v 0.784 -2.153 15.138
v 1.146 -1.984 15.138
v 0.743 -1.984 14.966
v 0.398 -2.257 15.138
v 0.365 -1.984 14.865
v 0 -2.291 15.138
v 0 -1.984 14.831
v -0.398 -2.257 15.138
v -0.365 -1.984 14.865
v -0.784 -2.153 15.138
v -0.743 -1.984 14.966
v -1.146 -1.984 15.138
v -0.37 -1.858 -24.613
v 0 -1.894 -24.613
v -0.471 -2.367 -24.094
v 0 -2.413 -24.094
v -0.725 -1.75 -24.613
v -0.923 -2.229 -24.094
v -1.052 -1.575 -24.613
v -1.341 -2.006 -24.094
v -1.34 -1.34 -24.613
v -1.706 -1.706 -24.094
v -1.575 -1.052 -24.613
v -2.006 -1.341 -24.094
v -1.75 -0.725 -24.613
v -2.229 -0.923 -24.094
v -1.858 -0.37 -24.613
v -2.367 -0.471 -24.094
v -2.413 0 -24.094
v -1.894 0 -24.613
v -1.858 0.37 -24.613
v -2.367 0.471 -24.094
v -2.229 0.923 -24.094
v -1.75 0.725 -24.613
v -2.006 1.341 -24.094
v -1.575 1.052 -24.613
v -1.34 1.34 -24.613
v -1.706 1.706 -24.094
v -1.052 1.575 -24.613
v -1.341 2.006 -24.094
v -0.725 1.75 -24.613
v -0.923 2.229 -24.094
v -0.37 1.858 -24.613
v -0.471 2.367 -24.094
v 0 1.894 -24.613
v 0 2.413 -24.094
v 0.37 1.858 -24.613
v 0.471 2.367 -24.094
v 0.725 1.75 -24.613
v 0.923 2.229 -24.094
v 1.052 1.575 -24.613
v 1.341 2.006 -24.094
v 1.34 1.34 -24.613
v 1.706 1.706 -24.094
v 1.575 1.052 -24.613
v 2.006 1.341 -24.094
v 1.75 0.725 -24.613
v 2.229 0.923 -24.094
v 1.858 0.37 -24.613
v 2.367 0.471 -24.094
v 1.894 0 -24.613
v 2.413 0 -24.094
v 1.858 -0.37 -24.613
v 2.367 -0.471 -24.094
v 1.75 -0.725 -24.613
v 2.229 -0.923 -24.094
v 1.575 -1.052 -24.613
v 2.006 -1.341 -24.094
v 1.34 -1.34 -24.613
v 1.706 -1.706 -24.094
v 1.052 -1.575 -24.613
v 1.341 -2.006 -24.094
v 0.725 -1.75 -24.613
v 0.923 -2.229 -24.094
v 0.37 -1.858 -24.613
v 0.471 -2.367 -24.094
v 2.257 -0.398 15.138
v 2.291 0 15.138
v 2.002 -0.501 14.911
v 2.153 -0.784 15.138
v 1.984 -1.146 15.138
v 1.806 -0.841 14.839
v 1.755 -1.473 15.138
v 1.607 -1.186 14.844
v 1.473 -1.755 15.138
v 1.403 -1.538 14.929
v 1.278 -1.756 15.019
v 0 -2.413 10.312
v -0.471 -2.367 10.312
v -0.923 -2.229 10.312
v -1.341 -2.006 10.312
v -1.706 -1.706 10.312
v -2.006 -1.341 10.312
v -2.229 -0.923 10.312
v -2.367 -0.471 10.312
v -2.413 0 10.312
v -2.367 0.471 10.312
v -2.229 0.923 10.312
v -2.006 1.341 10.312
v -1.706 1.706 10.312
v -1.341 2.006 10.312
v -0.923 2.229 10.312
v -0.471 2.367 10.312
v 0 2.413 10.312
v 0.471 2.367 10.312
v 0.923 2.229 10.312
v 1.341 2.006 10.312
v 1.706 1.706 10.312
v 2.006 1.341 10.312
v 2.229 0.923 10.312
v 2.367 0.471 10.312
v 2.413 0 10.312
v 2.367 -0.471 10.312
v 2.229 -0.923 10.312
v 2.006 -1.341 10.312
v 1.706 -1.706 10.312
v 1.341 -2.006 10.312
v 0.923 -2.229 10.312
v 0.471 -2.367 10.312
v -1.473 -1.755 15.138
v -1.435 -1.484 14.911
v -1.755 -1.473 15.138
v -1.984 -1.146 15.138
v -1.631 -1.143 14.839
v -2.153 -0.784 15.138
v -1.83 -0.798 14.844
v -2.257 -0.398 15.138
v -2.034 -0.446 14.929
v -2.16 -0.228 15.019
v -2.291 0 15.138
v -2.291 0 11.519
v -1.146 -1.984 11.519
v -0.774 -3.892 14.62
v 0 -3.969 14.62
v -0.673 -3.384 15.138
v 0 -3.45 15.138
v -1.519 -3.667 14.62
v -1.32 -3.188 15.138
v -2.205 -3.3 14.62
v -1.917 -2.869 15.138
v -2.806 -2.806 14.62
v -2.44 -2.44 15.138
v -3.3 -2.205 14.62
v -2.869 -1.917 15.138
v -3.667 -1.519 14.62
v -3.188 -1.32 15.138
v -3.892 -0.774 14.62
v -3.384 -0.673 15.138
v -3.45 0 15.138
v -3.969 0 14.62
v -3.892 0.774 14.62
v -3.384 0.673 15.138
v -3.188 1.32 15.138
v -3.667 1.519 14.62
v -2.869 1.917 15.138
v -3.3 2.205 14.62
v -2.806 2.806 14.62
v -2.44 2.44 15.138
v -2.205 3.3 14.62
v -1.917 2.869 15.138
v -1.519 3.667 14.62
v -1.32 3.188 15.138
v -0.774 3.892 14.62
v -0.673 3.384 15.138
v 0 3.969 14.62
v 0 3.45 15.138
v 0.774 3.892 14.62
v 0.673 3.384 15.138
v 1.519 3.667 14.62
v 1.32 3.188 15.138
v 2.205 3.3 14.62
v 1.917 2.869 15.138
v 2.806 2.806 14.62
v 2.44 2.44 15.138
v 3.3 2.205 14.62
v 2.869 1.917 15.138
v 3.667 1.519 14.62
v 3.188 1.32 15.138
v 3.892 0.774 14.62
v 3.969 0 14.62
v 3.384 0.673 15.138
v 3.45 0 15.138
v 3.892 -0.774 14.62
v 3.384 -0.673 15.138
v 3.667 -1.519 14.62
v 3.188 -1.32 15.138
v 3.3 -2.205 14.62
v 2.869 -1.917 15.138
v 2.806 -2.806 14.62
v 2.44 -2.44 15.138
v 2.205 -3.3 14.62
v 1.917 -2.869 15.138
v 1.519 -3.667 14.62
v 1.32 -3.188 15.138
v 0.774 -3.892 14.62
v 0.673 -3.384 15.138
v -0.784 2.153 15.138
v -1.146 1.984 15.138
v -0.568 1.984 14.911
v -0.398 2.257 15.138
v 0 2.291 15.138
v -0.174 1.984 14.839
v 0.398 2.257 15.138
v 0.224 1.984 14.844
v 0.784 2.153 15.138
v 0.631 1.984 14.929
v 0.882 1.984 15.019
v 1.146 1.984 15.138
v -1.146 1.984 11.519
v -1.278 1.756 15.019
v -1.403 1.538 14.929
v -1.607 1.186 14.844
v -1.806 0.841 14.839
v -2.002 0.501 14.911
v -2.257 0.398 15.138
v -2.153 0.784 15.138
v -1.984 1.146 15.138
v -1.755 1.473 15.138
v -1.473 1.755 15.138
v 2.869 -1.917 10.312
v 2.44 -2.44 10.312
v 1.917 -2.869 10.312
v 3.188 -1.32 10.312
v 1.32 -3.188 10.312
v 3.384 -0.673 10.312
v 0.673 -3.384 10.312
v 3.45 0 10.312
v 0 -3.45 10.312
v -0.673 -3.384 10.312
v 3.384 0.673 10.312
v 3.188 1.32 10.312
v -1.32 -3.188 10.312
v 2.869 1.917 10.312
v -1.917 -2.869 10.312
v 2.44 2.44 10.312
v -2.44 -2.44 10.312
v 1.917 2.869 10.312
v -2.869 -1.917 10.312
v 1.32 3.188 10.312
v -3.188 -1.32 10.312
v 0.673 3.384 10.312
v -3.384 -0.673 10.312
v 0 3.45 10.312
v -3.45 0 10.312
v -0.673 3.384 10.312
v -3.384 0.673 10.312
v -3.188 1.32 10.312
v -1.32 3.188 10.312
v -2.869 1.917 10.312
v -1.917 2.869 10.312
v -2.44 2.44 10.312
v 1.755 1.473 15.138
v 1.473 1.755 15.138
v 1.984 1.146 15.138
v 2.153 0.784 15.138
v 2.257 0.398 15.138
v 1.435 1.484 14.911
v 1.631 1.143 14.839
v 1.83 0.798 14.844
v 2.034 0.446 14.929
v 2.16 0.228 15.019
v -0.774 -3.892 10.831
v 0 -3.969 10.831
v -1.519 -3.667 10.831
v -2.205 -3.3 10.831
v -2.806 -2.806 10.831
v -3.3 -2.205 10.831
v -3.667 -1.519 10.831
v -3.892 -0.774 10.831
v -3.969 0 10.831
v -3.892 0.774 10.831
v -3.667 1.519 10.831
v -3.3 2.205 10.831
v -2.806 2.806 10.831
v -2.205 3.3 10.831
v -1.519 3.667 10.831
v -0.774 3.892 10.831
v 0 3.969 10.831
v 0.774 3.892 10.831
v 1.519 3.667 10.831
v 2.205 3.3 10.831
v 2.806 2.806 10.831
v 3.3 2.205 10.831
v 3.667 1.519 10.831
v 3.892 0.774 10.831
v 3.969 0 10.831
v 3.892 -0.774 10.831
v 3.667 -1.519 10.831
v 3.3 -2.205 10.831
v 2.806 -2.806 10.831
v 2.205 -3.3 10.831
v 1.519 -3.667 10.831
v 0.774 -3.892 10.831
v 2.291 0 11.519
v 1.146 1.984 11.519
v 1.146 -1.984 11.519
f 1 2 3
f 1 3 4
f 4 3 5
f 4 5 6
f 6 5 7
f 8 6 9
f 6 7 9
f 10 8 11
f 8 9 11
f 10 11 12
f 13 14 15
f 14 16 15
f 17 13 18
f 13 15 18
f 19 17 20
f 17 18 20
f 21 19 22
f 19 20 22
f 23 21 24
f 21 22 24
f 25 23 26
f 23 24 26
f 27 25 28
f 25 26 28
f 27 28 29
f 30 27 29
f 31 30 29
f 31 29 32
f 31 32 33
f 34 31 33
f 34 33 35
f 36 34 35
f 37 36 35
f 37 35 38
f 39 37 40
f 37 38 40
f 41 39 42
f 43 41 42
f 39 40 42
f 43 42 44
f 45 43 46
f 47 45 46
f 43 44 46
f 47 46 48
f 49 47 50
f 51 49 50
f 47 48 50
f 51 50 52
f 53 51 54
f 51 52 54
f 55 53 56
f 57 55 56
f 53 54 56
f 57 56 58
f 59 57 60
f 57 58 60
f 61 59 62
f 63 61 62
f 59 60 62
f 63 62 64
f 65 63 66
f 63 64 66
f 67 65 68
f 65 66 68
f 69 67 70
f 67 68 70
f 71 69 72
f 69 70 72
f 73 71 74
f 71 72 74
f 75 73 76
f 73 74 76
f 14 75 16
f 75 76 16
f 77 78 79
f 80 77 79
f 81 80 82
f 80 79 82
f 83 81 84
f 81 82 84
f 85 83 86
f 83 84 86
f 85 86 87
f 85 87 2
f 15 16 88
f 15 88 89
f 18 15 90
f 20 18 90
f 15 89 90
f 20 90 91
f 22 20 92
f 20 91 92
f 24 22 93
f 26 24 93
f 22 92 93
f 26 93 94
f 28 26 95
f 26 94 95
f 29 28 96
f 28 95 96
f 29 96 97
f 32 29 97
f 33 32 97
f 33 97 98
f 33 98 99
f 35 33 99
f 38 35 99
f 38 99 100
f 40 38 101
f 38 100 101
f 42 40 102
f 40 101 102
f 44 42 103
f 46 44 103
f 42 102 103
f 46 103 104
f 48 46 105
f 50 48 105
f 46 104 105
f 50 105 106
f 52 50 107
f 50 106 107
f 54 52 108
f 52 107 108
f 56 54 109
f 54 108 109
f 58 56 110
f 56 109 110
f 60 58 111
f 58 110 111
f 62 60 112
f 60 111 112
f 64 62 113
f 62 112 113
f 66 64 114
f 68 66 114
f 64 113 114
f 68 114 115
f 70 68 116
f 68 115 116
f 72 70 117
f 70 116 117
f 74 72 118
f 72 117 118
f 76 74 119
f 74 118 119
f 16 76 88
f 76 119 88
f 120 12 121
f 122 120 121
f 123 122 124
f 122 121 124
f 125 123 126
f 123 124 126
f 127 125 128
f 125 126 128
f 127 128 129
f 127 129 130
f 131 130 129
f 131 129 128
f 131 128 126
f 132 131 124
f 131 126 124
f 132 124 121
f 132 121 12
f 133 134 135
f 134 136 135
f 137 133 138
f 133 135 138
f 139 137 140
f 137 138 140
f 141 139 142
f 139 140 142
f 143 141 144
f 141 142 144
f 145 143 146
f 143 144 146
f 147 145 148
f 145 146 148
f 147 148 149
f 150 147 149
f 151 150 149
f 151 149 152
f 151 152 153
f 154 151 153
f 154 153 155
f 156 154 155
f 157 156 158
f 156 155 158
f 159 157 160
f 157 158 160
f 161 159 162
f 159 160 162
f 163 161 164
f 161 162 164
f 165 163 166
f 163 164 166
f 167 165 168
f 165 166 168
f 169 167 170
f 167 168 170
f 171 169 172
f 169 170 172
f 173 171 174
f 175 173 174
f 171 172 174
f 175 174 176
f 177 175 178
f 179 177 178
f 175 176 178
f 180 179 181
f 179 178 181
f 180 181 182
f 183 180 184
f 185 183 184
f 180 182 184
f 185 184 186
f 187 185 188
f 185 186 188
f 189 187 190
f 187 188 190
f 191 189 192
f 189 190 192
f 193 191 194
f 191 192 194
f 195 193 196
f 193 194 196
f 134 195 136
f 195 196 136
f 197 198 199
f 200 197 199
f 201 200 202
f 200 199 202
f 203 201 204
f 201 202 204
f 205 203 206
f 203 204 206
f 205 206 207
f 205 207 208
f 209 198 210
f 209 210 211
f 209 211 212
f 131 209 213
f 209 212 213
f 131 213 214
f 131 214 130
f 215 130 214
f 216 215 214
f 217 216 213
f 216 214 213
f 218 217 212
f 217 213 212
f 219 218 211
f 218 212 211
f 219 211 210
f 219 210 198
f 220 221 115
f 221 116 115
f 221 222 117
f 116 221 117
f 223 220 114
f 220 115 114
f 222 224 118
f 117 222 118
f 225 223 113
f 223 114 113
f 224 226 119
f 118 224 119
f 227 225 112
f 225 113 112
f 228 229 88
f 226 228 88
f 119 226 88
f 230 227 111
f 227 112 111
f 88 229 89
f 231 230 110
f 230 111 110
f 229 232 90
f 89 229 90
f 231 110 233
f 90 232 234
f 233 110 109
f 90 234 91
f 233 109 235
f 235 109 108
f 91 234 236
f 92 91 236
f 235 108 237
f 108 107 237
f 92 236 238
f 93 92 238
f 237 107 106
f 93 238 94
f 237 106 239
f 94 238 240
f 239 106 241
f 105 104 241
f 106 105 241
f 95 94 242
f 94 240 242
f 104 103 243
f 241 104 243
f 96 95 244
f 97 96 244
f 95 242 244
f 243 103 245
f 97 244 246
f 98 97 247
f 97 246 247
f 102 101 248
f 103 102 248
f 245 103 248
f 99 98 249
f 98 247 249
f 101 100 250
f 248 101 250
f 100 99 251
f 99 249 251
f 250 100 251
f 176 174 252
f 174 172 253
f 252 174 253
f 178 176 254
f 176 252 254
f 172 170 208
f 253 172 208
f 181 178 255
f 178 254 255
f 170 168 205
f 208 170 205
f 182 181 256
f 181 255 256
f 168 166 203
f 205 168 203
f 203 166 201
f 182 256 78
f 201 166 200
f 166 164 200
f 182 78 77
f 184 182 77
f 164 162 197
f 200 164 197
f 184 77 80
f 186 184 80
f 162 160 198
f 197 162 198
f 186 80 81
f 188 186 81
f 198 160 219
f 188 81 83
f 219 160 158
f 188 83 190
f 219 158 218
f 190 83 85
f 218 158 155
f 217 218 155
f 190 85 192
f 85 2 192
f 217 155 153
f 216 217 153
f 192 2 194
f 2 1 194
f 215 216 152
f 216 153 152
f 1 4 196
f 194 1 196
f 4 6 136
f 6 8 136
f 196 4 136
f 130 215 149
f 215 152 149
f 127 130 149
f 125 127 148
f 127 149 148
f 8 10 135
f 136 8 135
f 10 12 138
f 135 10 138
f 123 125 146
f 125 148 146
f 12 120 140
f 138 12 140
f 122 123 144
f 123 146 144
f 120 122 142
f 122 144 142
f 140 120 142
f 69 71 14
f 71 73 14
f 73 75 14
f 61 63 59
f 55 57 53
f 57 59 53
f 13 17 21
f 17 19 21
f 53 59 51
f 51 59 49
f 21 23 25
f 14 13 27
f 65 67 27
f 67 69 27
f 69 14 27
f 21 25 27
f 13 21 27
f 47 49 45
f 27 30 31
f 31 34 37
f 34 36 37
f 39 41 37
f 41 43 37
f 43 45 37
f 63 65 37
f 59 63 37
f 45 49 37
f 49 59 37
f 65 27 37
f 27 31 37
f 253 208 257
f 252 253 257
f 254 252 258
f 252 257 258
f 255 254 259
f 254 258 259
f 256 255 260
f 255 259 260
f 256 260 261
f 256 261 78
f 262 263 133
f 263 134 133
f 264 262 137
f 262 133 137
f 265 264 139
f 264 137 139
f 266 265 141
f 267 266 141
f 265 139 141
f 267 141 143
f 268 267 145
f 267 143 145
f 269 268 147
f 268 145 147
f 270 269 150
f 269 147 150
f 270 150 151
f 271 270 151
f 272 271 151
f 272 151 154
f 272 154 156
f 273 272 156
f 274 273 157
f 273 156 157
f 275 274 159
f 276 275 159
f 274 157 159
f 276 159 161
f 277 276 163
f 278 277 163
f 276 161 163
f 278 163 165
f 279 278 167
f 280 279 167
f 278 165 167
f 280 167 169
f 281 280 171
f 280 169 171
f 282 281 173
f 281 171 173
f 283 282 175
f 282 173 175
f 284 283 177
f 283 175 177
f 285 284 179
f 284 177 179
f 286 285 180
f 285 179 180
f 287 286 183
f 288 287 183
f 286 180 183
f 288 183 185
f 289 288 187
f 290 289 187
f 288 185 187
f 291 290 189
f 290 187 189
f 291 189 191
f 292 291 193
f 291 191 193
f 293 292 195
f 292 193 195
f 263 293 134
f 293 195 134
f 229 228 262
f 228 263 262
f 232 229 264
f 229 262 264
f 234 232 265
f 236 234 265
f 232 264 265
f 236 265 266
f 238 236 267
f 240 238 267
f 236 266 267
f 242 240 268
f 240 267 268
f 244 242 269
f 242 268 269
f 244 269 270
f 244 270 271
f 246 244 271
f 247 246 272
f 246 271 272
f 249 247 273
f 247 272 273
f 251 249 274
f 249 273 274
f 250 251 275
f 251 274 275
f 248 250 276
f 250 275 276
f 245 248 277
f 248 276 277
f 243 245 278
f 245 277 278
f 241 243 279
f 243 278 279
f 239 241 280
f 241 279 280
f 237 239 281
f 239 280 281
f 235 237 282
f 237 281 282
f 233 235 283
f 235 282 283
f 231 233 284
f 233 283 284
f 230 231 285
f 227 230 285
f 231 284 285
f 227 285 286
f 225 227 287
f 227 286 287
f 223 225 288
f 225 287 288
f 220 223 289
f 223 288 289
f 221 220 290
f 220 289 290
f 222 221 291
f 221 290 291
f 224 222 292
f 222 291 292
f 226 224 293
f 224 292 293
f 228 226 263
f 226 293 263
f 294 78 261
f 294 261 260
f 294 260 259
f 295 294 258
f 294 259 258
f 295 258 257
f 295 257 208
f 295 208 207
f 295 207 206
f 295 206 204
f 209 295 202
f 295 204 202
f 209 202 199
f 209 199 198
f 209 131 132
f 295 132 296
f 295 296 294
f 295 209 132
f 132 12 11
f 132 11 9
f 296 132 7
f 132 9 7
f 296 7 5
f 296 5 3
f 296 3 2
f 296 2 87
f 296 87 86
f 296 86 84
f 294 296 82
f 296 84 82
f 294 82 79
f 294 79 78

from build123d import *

# Parameters (mm, degrees)
CUT_EXTRUDE1_DEPTH = 3.6195


with BuildPart() as part:
    # Sketch2 → Revolve1 (revolve)
    with BuildSketch(Plane(origin=(0, 0, 0), x_dir=(0, 0, -1), z_dir=(1, 0, 0))):
        Polygon((-15.1384, 0), (24.6126, 0), (24.6126, 1.894416667), (24.094016667, 2.413), (-10.3124, 2.413), (-10.3124, 3.450166667), (-10.830983333, 3.96875), (-14.619816667, 3.96875), (-15.1384, 3.450166667), align=None)
    revolve(axis=Axis((0, 0, 10.3124), (0, 0, -1)))

    # Sketch3 → Cut-Extrude1 (cut)
    with BuildSketch(Plane.XY.offset(15.1384)):
        Polygon((1.14567944, 1.984375), (-1.14567944, 1.984375), (-2.291358881, 0), (-1.14567944, -1.984375), (1.14567944, -1.984375), (2.291358881, 0), align=None)
    extrude(amount=-CUT_EXTRUDE1_DEPTH, mode=Mode.SUBTRACT)

    # Cut-Extrude2 cone 1 section (through the dimple's axis) → Cut-Extrude2 (revolve, cut)
    with BuildSketch(Plane(origin=(0, 0, 15.1384), x_dir=(0, -1, 0), z_dir=(1, 0, 0))):
        Polygon((0, 0), (2.291358881, 0), (0, 2.291358881), align=None)
    revolve(axis=Axis((0, 0, 15.1384), (0, 0, -1)), mode=Mode.SUBTRACT)


solid = part.part
